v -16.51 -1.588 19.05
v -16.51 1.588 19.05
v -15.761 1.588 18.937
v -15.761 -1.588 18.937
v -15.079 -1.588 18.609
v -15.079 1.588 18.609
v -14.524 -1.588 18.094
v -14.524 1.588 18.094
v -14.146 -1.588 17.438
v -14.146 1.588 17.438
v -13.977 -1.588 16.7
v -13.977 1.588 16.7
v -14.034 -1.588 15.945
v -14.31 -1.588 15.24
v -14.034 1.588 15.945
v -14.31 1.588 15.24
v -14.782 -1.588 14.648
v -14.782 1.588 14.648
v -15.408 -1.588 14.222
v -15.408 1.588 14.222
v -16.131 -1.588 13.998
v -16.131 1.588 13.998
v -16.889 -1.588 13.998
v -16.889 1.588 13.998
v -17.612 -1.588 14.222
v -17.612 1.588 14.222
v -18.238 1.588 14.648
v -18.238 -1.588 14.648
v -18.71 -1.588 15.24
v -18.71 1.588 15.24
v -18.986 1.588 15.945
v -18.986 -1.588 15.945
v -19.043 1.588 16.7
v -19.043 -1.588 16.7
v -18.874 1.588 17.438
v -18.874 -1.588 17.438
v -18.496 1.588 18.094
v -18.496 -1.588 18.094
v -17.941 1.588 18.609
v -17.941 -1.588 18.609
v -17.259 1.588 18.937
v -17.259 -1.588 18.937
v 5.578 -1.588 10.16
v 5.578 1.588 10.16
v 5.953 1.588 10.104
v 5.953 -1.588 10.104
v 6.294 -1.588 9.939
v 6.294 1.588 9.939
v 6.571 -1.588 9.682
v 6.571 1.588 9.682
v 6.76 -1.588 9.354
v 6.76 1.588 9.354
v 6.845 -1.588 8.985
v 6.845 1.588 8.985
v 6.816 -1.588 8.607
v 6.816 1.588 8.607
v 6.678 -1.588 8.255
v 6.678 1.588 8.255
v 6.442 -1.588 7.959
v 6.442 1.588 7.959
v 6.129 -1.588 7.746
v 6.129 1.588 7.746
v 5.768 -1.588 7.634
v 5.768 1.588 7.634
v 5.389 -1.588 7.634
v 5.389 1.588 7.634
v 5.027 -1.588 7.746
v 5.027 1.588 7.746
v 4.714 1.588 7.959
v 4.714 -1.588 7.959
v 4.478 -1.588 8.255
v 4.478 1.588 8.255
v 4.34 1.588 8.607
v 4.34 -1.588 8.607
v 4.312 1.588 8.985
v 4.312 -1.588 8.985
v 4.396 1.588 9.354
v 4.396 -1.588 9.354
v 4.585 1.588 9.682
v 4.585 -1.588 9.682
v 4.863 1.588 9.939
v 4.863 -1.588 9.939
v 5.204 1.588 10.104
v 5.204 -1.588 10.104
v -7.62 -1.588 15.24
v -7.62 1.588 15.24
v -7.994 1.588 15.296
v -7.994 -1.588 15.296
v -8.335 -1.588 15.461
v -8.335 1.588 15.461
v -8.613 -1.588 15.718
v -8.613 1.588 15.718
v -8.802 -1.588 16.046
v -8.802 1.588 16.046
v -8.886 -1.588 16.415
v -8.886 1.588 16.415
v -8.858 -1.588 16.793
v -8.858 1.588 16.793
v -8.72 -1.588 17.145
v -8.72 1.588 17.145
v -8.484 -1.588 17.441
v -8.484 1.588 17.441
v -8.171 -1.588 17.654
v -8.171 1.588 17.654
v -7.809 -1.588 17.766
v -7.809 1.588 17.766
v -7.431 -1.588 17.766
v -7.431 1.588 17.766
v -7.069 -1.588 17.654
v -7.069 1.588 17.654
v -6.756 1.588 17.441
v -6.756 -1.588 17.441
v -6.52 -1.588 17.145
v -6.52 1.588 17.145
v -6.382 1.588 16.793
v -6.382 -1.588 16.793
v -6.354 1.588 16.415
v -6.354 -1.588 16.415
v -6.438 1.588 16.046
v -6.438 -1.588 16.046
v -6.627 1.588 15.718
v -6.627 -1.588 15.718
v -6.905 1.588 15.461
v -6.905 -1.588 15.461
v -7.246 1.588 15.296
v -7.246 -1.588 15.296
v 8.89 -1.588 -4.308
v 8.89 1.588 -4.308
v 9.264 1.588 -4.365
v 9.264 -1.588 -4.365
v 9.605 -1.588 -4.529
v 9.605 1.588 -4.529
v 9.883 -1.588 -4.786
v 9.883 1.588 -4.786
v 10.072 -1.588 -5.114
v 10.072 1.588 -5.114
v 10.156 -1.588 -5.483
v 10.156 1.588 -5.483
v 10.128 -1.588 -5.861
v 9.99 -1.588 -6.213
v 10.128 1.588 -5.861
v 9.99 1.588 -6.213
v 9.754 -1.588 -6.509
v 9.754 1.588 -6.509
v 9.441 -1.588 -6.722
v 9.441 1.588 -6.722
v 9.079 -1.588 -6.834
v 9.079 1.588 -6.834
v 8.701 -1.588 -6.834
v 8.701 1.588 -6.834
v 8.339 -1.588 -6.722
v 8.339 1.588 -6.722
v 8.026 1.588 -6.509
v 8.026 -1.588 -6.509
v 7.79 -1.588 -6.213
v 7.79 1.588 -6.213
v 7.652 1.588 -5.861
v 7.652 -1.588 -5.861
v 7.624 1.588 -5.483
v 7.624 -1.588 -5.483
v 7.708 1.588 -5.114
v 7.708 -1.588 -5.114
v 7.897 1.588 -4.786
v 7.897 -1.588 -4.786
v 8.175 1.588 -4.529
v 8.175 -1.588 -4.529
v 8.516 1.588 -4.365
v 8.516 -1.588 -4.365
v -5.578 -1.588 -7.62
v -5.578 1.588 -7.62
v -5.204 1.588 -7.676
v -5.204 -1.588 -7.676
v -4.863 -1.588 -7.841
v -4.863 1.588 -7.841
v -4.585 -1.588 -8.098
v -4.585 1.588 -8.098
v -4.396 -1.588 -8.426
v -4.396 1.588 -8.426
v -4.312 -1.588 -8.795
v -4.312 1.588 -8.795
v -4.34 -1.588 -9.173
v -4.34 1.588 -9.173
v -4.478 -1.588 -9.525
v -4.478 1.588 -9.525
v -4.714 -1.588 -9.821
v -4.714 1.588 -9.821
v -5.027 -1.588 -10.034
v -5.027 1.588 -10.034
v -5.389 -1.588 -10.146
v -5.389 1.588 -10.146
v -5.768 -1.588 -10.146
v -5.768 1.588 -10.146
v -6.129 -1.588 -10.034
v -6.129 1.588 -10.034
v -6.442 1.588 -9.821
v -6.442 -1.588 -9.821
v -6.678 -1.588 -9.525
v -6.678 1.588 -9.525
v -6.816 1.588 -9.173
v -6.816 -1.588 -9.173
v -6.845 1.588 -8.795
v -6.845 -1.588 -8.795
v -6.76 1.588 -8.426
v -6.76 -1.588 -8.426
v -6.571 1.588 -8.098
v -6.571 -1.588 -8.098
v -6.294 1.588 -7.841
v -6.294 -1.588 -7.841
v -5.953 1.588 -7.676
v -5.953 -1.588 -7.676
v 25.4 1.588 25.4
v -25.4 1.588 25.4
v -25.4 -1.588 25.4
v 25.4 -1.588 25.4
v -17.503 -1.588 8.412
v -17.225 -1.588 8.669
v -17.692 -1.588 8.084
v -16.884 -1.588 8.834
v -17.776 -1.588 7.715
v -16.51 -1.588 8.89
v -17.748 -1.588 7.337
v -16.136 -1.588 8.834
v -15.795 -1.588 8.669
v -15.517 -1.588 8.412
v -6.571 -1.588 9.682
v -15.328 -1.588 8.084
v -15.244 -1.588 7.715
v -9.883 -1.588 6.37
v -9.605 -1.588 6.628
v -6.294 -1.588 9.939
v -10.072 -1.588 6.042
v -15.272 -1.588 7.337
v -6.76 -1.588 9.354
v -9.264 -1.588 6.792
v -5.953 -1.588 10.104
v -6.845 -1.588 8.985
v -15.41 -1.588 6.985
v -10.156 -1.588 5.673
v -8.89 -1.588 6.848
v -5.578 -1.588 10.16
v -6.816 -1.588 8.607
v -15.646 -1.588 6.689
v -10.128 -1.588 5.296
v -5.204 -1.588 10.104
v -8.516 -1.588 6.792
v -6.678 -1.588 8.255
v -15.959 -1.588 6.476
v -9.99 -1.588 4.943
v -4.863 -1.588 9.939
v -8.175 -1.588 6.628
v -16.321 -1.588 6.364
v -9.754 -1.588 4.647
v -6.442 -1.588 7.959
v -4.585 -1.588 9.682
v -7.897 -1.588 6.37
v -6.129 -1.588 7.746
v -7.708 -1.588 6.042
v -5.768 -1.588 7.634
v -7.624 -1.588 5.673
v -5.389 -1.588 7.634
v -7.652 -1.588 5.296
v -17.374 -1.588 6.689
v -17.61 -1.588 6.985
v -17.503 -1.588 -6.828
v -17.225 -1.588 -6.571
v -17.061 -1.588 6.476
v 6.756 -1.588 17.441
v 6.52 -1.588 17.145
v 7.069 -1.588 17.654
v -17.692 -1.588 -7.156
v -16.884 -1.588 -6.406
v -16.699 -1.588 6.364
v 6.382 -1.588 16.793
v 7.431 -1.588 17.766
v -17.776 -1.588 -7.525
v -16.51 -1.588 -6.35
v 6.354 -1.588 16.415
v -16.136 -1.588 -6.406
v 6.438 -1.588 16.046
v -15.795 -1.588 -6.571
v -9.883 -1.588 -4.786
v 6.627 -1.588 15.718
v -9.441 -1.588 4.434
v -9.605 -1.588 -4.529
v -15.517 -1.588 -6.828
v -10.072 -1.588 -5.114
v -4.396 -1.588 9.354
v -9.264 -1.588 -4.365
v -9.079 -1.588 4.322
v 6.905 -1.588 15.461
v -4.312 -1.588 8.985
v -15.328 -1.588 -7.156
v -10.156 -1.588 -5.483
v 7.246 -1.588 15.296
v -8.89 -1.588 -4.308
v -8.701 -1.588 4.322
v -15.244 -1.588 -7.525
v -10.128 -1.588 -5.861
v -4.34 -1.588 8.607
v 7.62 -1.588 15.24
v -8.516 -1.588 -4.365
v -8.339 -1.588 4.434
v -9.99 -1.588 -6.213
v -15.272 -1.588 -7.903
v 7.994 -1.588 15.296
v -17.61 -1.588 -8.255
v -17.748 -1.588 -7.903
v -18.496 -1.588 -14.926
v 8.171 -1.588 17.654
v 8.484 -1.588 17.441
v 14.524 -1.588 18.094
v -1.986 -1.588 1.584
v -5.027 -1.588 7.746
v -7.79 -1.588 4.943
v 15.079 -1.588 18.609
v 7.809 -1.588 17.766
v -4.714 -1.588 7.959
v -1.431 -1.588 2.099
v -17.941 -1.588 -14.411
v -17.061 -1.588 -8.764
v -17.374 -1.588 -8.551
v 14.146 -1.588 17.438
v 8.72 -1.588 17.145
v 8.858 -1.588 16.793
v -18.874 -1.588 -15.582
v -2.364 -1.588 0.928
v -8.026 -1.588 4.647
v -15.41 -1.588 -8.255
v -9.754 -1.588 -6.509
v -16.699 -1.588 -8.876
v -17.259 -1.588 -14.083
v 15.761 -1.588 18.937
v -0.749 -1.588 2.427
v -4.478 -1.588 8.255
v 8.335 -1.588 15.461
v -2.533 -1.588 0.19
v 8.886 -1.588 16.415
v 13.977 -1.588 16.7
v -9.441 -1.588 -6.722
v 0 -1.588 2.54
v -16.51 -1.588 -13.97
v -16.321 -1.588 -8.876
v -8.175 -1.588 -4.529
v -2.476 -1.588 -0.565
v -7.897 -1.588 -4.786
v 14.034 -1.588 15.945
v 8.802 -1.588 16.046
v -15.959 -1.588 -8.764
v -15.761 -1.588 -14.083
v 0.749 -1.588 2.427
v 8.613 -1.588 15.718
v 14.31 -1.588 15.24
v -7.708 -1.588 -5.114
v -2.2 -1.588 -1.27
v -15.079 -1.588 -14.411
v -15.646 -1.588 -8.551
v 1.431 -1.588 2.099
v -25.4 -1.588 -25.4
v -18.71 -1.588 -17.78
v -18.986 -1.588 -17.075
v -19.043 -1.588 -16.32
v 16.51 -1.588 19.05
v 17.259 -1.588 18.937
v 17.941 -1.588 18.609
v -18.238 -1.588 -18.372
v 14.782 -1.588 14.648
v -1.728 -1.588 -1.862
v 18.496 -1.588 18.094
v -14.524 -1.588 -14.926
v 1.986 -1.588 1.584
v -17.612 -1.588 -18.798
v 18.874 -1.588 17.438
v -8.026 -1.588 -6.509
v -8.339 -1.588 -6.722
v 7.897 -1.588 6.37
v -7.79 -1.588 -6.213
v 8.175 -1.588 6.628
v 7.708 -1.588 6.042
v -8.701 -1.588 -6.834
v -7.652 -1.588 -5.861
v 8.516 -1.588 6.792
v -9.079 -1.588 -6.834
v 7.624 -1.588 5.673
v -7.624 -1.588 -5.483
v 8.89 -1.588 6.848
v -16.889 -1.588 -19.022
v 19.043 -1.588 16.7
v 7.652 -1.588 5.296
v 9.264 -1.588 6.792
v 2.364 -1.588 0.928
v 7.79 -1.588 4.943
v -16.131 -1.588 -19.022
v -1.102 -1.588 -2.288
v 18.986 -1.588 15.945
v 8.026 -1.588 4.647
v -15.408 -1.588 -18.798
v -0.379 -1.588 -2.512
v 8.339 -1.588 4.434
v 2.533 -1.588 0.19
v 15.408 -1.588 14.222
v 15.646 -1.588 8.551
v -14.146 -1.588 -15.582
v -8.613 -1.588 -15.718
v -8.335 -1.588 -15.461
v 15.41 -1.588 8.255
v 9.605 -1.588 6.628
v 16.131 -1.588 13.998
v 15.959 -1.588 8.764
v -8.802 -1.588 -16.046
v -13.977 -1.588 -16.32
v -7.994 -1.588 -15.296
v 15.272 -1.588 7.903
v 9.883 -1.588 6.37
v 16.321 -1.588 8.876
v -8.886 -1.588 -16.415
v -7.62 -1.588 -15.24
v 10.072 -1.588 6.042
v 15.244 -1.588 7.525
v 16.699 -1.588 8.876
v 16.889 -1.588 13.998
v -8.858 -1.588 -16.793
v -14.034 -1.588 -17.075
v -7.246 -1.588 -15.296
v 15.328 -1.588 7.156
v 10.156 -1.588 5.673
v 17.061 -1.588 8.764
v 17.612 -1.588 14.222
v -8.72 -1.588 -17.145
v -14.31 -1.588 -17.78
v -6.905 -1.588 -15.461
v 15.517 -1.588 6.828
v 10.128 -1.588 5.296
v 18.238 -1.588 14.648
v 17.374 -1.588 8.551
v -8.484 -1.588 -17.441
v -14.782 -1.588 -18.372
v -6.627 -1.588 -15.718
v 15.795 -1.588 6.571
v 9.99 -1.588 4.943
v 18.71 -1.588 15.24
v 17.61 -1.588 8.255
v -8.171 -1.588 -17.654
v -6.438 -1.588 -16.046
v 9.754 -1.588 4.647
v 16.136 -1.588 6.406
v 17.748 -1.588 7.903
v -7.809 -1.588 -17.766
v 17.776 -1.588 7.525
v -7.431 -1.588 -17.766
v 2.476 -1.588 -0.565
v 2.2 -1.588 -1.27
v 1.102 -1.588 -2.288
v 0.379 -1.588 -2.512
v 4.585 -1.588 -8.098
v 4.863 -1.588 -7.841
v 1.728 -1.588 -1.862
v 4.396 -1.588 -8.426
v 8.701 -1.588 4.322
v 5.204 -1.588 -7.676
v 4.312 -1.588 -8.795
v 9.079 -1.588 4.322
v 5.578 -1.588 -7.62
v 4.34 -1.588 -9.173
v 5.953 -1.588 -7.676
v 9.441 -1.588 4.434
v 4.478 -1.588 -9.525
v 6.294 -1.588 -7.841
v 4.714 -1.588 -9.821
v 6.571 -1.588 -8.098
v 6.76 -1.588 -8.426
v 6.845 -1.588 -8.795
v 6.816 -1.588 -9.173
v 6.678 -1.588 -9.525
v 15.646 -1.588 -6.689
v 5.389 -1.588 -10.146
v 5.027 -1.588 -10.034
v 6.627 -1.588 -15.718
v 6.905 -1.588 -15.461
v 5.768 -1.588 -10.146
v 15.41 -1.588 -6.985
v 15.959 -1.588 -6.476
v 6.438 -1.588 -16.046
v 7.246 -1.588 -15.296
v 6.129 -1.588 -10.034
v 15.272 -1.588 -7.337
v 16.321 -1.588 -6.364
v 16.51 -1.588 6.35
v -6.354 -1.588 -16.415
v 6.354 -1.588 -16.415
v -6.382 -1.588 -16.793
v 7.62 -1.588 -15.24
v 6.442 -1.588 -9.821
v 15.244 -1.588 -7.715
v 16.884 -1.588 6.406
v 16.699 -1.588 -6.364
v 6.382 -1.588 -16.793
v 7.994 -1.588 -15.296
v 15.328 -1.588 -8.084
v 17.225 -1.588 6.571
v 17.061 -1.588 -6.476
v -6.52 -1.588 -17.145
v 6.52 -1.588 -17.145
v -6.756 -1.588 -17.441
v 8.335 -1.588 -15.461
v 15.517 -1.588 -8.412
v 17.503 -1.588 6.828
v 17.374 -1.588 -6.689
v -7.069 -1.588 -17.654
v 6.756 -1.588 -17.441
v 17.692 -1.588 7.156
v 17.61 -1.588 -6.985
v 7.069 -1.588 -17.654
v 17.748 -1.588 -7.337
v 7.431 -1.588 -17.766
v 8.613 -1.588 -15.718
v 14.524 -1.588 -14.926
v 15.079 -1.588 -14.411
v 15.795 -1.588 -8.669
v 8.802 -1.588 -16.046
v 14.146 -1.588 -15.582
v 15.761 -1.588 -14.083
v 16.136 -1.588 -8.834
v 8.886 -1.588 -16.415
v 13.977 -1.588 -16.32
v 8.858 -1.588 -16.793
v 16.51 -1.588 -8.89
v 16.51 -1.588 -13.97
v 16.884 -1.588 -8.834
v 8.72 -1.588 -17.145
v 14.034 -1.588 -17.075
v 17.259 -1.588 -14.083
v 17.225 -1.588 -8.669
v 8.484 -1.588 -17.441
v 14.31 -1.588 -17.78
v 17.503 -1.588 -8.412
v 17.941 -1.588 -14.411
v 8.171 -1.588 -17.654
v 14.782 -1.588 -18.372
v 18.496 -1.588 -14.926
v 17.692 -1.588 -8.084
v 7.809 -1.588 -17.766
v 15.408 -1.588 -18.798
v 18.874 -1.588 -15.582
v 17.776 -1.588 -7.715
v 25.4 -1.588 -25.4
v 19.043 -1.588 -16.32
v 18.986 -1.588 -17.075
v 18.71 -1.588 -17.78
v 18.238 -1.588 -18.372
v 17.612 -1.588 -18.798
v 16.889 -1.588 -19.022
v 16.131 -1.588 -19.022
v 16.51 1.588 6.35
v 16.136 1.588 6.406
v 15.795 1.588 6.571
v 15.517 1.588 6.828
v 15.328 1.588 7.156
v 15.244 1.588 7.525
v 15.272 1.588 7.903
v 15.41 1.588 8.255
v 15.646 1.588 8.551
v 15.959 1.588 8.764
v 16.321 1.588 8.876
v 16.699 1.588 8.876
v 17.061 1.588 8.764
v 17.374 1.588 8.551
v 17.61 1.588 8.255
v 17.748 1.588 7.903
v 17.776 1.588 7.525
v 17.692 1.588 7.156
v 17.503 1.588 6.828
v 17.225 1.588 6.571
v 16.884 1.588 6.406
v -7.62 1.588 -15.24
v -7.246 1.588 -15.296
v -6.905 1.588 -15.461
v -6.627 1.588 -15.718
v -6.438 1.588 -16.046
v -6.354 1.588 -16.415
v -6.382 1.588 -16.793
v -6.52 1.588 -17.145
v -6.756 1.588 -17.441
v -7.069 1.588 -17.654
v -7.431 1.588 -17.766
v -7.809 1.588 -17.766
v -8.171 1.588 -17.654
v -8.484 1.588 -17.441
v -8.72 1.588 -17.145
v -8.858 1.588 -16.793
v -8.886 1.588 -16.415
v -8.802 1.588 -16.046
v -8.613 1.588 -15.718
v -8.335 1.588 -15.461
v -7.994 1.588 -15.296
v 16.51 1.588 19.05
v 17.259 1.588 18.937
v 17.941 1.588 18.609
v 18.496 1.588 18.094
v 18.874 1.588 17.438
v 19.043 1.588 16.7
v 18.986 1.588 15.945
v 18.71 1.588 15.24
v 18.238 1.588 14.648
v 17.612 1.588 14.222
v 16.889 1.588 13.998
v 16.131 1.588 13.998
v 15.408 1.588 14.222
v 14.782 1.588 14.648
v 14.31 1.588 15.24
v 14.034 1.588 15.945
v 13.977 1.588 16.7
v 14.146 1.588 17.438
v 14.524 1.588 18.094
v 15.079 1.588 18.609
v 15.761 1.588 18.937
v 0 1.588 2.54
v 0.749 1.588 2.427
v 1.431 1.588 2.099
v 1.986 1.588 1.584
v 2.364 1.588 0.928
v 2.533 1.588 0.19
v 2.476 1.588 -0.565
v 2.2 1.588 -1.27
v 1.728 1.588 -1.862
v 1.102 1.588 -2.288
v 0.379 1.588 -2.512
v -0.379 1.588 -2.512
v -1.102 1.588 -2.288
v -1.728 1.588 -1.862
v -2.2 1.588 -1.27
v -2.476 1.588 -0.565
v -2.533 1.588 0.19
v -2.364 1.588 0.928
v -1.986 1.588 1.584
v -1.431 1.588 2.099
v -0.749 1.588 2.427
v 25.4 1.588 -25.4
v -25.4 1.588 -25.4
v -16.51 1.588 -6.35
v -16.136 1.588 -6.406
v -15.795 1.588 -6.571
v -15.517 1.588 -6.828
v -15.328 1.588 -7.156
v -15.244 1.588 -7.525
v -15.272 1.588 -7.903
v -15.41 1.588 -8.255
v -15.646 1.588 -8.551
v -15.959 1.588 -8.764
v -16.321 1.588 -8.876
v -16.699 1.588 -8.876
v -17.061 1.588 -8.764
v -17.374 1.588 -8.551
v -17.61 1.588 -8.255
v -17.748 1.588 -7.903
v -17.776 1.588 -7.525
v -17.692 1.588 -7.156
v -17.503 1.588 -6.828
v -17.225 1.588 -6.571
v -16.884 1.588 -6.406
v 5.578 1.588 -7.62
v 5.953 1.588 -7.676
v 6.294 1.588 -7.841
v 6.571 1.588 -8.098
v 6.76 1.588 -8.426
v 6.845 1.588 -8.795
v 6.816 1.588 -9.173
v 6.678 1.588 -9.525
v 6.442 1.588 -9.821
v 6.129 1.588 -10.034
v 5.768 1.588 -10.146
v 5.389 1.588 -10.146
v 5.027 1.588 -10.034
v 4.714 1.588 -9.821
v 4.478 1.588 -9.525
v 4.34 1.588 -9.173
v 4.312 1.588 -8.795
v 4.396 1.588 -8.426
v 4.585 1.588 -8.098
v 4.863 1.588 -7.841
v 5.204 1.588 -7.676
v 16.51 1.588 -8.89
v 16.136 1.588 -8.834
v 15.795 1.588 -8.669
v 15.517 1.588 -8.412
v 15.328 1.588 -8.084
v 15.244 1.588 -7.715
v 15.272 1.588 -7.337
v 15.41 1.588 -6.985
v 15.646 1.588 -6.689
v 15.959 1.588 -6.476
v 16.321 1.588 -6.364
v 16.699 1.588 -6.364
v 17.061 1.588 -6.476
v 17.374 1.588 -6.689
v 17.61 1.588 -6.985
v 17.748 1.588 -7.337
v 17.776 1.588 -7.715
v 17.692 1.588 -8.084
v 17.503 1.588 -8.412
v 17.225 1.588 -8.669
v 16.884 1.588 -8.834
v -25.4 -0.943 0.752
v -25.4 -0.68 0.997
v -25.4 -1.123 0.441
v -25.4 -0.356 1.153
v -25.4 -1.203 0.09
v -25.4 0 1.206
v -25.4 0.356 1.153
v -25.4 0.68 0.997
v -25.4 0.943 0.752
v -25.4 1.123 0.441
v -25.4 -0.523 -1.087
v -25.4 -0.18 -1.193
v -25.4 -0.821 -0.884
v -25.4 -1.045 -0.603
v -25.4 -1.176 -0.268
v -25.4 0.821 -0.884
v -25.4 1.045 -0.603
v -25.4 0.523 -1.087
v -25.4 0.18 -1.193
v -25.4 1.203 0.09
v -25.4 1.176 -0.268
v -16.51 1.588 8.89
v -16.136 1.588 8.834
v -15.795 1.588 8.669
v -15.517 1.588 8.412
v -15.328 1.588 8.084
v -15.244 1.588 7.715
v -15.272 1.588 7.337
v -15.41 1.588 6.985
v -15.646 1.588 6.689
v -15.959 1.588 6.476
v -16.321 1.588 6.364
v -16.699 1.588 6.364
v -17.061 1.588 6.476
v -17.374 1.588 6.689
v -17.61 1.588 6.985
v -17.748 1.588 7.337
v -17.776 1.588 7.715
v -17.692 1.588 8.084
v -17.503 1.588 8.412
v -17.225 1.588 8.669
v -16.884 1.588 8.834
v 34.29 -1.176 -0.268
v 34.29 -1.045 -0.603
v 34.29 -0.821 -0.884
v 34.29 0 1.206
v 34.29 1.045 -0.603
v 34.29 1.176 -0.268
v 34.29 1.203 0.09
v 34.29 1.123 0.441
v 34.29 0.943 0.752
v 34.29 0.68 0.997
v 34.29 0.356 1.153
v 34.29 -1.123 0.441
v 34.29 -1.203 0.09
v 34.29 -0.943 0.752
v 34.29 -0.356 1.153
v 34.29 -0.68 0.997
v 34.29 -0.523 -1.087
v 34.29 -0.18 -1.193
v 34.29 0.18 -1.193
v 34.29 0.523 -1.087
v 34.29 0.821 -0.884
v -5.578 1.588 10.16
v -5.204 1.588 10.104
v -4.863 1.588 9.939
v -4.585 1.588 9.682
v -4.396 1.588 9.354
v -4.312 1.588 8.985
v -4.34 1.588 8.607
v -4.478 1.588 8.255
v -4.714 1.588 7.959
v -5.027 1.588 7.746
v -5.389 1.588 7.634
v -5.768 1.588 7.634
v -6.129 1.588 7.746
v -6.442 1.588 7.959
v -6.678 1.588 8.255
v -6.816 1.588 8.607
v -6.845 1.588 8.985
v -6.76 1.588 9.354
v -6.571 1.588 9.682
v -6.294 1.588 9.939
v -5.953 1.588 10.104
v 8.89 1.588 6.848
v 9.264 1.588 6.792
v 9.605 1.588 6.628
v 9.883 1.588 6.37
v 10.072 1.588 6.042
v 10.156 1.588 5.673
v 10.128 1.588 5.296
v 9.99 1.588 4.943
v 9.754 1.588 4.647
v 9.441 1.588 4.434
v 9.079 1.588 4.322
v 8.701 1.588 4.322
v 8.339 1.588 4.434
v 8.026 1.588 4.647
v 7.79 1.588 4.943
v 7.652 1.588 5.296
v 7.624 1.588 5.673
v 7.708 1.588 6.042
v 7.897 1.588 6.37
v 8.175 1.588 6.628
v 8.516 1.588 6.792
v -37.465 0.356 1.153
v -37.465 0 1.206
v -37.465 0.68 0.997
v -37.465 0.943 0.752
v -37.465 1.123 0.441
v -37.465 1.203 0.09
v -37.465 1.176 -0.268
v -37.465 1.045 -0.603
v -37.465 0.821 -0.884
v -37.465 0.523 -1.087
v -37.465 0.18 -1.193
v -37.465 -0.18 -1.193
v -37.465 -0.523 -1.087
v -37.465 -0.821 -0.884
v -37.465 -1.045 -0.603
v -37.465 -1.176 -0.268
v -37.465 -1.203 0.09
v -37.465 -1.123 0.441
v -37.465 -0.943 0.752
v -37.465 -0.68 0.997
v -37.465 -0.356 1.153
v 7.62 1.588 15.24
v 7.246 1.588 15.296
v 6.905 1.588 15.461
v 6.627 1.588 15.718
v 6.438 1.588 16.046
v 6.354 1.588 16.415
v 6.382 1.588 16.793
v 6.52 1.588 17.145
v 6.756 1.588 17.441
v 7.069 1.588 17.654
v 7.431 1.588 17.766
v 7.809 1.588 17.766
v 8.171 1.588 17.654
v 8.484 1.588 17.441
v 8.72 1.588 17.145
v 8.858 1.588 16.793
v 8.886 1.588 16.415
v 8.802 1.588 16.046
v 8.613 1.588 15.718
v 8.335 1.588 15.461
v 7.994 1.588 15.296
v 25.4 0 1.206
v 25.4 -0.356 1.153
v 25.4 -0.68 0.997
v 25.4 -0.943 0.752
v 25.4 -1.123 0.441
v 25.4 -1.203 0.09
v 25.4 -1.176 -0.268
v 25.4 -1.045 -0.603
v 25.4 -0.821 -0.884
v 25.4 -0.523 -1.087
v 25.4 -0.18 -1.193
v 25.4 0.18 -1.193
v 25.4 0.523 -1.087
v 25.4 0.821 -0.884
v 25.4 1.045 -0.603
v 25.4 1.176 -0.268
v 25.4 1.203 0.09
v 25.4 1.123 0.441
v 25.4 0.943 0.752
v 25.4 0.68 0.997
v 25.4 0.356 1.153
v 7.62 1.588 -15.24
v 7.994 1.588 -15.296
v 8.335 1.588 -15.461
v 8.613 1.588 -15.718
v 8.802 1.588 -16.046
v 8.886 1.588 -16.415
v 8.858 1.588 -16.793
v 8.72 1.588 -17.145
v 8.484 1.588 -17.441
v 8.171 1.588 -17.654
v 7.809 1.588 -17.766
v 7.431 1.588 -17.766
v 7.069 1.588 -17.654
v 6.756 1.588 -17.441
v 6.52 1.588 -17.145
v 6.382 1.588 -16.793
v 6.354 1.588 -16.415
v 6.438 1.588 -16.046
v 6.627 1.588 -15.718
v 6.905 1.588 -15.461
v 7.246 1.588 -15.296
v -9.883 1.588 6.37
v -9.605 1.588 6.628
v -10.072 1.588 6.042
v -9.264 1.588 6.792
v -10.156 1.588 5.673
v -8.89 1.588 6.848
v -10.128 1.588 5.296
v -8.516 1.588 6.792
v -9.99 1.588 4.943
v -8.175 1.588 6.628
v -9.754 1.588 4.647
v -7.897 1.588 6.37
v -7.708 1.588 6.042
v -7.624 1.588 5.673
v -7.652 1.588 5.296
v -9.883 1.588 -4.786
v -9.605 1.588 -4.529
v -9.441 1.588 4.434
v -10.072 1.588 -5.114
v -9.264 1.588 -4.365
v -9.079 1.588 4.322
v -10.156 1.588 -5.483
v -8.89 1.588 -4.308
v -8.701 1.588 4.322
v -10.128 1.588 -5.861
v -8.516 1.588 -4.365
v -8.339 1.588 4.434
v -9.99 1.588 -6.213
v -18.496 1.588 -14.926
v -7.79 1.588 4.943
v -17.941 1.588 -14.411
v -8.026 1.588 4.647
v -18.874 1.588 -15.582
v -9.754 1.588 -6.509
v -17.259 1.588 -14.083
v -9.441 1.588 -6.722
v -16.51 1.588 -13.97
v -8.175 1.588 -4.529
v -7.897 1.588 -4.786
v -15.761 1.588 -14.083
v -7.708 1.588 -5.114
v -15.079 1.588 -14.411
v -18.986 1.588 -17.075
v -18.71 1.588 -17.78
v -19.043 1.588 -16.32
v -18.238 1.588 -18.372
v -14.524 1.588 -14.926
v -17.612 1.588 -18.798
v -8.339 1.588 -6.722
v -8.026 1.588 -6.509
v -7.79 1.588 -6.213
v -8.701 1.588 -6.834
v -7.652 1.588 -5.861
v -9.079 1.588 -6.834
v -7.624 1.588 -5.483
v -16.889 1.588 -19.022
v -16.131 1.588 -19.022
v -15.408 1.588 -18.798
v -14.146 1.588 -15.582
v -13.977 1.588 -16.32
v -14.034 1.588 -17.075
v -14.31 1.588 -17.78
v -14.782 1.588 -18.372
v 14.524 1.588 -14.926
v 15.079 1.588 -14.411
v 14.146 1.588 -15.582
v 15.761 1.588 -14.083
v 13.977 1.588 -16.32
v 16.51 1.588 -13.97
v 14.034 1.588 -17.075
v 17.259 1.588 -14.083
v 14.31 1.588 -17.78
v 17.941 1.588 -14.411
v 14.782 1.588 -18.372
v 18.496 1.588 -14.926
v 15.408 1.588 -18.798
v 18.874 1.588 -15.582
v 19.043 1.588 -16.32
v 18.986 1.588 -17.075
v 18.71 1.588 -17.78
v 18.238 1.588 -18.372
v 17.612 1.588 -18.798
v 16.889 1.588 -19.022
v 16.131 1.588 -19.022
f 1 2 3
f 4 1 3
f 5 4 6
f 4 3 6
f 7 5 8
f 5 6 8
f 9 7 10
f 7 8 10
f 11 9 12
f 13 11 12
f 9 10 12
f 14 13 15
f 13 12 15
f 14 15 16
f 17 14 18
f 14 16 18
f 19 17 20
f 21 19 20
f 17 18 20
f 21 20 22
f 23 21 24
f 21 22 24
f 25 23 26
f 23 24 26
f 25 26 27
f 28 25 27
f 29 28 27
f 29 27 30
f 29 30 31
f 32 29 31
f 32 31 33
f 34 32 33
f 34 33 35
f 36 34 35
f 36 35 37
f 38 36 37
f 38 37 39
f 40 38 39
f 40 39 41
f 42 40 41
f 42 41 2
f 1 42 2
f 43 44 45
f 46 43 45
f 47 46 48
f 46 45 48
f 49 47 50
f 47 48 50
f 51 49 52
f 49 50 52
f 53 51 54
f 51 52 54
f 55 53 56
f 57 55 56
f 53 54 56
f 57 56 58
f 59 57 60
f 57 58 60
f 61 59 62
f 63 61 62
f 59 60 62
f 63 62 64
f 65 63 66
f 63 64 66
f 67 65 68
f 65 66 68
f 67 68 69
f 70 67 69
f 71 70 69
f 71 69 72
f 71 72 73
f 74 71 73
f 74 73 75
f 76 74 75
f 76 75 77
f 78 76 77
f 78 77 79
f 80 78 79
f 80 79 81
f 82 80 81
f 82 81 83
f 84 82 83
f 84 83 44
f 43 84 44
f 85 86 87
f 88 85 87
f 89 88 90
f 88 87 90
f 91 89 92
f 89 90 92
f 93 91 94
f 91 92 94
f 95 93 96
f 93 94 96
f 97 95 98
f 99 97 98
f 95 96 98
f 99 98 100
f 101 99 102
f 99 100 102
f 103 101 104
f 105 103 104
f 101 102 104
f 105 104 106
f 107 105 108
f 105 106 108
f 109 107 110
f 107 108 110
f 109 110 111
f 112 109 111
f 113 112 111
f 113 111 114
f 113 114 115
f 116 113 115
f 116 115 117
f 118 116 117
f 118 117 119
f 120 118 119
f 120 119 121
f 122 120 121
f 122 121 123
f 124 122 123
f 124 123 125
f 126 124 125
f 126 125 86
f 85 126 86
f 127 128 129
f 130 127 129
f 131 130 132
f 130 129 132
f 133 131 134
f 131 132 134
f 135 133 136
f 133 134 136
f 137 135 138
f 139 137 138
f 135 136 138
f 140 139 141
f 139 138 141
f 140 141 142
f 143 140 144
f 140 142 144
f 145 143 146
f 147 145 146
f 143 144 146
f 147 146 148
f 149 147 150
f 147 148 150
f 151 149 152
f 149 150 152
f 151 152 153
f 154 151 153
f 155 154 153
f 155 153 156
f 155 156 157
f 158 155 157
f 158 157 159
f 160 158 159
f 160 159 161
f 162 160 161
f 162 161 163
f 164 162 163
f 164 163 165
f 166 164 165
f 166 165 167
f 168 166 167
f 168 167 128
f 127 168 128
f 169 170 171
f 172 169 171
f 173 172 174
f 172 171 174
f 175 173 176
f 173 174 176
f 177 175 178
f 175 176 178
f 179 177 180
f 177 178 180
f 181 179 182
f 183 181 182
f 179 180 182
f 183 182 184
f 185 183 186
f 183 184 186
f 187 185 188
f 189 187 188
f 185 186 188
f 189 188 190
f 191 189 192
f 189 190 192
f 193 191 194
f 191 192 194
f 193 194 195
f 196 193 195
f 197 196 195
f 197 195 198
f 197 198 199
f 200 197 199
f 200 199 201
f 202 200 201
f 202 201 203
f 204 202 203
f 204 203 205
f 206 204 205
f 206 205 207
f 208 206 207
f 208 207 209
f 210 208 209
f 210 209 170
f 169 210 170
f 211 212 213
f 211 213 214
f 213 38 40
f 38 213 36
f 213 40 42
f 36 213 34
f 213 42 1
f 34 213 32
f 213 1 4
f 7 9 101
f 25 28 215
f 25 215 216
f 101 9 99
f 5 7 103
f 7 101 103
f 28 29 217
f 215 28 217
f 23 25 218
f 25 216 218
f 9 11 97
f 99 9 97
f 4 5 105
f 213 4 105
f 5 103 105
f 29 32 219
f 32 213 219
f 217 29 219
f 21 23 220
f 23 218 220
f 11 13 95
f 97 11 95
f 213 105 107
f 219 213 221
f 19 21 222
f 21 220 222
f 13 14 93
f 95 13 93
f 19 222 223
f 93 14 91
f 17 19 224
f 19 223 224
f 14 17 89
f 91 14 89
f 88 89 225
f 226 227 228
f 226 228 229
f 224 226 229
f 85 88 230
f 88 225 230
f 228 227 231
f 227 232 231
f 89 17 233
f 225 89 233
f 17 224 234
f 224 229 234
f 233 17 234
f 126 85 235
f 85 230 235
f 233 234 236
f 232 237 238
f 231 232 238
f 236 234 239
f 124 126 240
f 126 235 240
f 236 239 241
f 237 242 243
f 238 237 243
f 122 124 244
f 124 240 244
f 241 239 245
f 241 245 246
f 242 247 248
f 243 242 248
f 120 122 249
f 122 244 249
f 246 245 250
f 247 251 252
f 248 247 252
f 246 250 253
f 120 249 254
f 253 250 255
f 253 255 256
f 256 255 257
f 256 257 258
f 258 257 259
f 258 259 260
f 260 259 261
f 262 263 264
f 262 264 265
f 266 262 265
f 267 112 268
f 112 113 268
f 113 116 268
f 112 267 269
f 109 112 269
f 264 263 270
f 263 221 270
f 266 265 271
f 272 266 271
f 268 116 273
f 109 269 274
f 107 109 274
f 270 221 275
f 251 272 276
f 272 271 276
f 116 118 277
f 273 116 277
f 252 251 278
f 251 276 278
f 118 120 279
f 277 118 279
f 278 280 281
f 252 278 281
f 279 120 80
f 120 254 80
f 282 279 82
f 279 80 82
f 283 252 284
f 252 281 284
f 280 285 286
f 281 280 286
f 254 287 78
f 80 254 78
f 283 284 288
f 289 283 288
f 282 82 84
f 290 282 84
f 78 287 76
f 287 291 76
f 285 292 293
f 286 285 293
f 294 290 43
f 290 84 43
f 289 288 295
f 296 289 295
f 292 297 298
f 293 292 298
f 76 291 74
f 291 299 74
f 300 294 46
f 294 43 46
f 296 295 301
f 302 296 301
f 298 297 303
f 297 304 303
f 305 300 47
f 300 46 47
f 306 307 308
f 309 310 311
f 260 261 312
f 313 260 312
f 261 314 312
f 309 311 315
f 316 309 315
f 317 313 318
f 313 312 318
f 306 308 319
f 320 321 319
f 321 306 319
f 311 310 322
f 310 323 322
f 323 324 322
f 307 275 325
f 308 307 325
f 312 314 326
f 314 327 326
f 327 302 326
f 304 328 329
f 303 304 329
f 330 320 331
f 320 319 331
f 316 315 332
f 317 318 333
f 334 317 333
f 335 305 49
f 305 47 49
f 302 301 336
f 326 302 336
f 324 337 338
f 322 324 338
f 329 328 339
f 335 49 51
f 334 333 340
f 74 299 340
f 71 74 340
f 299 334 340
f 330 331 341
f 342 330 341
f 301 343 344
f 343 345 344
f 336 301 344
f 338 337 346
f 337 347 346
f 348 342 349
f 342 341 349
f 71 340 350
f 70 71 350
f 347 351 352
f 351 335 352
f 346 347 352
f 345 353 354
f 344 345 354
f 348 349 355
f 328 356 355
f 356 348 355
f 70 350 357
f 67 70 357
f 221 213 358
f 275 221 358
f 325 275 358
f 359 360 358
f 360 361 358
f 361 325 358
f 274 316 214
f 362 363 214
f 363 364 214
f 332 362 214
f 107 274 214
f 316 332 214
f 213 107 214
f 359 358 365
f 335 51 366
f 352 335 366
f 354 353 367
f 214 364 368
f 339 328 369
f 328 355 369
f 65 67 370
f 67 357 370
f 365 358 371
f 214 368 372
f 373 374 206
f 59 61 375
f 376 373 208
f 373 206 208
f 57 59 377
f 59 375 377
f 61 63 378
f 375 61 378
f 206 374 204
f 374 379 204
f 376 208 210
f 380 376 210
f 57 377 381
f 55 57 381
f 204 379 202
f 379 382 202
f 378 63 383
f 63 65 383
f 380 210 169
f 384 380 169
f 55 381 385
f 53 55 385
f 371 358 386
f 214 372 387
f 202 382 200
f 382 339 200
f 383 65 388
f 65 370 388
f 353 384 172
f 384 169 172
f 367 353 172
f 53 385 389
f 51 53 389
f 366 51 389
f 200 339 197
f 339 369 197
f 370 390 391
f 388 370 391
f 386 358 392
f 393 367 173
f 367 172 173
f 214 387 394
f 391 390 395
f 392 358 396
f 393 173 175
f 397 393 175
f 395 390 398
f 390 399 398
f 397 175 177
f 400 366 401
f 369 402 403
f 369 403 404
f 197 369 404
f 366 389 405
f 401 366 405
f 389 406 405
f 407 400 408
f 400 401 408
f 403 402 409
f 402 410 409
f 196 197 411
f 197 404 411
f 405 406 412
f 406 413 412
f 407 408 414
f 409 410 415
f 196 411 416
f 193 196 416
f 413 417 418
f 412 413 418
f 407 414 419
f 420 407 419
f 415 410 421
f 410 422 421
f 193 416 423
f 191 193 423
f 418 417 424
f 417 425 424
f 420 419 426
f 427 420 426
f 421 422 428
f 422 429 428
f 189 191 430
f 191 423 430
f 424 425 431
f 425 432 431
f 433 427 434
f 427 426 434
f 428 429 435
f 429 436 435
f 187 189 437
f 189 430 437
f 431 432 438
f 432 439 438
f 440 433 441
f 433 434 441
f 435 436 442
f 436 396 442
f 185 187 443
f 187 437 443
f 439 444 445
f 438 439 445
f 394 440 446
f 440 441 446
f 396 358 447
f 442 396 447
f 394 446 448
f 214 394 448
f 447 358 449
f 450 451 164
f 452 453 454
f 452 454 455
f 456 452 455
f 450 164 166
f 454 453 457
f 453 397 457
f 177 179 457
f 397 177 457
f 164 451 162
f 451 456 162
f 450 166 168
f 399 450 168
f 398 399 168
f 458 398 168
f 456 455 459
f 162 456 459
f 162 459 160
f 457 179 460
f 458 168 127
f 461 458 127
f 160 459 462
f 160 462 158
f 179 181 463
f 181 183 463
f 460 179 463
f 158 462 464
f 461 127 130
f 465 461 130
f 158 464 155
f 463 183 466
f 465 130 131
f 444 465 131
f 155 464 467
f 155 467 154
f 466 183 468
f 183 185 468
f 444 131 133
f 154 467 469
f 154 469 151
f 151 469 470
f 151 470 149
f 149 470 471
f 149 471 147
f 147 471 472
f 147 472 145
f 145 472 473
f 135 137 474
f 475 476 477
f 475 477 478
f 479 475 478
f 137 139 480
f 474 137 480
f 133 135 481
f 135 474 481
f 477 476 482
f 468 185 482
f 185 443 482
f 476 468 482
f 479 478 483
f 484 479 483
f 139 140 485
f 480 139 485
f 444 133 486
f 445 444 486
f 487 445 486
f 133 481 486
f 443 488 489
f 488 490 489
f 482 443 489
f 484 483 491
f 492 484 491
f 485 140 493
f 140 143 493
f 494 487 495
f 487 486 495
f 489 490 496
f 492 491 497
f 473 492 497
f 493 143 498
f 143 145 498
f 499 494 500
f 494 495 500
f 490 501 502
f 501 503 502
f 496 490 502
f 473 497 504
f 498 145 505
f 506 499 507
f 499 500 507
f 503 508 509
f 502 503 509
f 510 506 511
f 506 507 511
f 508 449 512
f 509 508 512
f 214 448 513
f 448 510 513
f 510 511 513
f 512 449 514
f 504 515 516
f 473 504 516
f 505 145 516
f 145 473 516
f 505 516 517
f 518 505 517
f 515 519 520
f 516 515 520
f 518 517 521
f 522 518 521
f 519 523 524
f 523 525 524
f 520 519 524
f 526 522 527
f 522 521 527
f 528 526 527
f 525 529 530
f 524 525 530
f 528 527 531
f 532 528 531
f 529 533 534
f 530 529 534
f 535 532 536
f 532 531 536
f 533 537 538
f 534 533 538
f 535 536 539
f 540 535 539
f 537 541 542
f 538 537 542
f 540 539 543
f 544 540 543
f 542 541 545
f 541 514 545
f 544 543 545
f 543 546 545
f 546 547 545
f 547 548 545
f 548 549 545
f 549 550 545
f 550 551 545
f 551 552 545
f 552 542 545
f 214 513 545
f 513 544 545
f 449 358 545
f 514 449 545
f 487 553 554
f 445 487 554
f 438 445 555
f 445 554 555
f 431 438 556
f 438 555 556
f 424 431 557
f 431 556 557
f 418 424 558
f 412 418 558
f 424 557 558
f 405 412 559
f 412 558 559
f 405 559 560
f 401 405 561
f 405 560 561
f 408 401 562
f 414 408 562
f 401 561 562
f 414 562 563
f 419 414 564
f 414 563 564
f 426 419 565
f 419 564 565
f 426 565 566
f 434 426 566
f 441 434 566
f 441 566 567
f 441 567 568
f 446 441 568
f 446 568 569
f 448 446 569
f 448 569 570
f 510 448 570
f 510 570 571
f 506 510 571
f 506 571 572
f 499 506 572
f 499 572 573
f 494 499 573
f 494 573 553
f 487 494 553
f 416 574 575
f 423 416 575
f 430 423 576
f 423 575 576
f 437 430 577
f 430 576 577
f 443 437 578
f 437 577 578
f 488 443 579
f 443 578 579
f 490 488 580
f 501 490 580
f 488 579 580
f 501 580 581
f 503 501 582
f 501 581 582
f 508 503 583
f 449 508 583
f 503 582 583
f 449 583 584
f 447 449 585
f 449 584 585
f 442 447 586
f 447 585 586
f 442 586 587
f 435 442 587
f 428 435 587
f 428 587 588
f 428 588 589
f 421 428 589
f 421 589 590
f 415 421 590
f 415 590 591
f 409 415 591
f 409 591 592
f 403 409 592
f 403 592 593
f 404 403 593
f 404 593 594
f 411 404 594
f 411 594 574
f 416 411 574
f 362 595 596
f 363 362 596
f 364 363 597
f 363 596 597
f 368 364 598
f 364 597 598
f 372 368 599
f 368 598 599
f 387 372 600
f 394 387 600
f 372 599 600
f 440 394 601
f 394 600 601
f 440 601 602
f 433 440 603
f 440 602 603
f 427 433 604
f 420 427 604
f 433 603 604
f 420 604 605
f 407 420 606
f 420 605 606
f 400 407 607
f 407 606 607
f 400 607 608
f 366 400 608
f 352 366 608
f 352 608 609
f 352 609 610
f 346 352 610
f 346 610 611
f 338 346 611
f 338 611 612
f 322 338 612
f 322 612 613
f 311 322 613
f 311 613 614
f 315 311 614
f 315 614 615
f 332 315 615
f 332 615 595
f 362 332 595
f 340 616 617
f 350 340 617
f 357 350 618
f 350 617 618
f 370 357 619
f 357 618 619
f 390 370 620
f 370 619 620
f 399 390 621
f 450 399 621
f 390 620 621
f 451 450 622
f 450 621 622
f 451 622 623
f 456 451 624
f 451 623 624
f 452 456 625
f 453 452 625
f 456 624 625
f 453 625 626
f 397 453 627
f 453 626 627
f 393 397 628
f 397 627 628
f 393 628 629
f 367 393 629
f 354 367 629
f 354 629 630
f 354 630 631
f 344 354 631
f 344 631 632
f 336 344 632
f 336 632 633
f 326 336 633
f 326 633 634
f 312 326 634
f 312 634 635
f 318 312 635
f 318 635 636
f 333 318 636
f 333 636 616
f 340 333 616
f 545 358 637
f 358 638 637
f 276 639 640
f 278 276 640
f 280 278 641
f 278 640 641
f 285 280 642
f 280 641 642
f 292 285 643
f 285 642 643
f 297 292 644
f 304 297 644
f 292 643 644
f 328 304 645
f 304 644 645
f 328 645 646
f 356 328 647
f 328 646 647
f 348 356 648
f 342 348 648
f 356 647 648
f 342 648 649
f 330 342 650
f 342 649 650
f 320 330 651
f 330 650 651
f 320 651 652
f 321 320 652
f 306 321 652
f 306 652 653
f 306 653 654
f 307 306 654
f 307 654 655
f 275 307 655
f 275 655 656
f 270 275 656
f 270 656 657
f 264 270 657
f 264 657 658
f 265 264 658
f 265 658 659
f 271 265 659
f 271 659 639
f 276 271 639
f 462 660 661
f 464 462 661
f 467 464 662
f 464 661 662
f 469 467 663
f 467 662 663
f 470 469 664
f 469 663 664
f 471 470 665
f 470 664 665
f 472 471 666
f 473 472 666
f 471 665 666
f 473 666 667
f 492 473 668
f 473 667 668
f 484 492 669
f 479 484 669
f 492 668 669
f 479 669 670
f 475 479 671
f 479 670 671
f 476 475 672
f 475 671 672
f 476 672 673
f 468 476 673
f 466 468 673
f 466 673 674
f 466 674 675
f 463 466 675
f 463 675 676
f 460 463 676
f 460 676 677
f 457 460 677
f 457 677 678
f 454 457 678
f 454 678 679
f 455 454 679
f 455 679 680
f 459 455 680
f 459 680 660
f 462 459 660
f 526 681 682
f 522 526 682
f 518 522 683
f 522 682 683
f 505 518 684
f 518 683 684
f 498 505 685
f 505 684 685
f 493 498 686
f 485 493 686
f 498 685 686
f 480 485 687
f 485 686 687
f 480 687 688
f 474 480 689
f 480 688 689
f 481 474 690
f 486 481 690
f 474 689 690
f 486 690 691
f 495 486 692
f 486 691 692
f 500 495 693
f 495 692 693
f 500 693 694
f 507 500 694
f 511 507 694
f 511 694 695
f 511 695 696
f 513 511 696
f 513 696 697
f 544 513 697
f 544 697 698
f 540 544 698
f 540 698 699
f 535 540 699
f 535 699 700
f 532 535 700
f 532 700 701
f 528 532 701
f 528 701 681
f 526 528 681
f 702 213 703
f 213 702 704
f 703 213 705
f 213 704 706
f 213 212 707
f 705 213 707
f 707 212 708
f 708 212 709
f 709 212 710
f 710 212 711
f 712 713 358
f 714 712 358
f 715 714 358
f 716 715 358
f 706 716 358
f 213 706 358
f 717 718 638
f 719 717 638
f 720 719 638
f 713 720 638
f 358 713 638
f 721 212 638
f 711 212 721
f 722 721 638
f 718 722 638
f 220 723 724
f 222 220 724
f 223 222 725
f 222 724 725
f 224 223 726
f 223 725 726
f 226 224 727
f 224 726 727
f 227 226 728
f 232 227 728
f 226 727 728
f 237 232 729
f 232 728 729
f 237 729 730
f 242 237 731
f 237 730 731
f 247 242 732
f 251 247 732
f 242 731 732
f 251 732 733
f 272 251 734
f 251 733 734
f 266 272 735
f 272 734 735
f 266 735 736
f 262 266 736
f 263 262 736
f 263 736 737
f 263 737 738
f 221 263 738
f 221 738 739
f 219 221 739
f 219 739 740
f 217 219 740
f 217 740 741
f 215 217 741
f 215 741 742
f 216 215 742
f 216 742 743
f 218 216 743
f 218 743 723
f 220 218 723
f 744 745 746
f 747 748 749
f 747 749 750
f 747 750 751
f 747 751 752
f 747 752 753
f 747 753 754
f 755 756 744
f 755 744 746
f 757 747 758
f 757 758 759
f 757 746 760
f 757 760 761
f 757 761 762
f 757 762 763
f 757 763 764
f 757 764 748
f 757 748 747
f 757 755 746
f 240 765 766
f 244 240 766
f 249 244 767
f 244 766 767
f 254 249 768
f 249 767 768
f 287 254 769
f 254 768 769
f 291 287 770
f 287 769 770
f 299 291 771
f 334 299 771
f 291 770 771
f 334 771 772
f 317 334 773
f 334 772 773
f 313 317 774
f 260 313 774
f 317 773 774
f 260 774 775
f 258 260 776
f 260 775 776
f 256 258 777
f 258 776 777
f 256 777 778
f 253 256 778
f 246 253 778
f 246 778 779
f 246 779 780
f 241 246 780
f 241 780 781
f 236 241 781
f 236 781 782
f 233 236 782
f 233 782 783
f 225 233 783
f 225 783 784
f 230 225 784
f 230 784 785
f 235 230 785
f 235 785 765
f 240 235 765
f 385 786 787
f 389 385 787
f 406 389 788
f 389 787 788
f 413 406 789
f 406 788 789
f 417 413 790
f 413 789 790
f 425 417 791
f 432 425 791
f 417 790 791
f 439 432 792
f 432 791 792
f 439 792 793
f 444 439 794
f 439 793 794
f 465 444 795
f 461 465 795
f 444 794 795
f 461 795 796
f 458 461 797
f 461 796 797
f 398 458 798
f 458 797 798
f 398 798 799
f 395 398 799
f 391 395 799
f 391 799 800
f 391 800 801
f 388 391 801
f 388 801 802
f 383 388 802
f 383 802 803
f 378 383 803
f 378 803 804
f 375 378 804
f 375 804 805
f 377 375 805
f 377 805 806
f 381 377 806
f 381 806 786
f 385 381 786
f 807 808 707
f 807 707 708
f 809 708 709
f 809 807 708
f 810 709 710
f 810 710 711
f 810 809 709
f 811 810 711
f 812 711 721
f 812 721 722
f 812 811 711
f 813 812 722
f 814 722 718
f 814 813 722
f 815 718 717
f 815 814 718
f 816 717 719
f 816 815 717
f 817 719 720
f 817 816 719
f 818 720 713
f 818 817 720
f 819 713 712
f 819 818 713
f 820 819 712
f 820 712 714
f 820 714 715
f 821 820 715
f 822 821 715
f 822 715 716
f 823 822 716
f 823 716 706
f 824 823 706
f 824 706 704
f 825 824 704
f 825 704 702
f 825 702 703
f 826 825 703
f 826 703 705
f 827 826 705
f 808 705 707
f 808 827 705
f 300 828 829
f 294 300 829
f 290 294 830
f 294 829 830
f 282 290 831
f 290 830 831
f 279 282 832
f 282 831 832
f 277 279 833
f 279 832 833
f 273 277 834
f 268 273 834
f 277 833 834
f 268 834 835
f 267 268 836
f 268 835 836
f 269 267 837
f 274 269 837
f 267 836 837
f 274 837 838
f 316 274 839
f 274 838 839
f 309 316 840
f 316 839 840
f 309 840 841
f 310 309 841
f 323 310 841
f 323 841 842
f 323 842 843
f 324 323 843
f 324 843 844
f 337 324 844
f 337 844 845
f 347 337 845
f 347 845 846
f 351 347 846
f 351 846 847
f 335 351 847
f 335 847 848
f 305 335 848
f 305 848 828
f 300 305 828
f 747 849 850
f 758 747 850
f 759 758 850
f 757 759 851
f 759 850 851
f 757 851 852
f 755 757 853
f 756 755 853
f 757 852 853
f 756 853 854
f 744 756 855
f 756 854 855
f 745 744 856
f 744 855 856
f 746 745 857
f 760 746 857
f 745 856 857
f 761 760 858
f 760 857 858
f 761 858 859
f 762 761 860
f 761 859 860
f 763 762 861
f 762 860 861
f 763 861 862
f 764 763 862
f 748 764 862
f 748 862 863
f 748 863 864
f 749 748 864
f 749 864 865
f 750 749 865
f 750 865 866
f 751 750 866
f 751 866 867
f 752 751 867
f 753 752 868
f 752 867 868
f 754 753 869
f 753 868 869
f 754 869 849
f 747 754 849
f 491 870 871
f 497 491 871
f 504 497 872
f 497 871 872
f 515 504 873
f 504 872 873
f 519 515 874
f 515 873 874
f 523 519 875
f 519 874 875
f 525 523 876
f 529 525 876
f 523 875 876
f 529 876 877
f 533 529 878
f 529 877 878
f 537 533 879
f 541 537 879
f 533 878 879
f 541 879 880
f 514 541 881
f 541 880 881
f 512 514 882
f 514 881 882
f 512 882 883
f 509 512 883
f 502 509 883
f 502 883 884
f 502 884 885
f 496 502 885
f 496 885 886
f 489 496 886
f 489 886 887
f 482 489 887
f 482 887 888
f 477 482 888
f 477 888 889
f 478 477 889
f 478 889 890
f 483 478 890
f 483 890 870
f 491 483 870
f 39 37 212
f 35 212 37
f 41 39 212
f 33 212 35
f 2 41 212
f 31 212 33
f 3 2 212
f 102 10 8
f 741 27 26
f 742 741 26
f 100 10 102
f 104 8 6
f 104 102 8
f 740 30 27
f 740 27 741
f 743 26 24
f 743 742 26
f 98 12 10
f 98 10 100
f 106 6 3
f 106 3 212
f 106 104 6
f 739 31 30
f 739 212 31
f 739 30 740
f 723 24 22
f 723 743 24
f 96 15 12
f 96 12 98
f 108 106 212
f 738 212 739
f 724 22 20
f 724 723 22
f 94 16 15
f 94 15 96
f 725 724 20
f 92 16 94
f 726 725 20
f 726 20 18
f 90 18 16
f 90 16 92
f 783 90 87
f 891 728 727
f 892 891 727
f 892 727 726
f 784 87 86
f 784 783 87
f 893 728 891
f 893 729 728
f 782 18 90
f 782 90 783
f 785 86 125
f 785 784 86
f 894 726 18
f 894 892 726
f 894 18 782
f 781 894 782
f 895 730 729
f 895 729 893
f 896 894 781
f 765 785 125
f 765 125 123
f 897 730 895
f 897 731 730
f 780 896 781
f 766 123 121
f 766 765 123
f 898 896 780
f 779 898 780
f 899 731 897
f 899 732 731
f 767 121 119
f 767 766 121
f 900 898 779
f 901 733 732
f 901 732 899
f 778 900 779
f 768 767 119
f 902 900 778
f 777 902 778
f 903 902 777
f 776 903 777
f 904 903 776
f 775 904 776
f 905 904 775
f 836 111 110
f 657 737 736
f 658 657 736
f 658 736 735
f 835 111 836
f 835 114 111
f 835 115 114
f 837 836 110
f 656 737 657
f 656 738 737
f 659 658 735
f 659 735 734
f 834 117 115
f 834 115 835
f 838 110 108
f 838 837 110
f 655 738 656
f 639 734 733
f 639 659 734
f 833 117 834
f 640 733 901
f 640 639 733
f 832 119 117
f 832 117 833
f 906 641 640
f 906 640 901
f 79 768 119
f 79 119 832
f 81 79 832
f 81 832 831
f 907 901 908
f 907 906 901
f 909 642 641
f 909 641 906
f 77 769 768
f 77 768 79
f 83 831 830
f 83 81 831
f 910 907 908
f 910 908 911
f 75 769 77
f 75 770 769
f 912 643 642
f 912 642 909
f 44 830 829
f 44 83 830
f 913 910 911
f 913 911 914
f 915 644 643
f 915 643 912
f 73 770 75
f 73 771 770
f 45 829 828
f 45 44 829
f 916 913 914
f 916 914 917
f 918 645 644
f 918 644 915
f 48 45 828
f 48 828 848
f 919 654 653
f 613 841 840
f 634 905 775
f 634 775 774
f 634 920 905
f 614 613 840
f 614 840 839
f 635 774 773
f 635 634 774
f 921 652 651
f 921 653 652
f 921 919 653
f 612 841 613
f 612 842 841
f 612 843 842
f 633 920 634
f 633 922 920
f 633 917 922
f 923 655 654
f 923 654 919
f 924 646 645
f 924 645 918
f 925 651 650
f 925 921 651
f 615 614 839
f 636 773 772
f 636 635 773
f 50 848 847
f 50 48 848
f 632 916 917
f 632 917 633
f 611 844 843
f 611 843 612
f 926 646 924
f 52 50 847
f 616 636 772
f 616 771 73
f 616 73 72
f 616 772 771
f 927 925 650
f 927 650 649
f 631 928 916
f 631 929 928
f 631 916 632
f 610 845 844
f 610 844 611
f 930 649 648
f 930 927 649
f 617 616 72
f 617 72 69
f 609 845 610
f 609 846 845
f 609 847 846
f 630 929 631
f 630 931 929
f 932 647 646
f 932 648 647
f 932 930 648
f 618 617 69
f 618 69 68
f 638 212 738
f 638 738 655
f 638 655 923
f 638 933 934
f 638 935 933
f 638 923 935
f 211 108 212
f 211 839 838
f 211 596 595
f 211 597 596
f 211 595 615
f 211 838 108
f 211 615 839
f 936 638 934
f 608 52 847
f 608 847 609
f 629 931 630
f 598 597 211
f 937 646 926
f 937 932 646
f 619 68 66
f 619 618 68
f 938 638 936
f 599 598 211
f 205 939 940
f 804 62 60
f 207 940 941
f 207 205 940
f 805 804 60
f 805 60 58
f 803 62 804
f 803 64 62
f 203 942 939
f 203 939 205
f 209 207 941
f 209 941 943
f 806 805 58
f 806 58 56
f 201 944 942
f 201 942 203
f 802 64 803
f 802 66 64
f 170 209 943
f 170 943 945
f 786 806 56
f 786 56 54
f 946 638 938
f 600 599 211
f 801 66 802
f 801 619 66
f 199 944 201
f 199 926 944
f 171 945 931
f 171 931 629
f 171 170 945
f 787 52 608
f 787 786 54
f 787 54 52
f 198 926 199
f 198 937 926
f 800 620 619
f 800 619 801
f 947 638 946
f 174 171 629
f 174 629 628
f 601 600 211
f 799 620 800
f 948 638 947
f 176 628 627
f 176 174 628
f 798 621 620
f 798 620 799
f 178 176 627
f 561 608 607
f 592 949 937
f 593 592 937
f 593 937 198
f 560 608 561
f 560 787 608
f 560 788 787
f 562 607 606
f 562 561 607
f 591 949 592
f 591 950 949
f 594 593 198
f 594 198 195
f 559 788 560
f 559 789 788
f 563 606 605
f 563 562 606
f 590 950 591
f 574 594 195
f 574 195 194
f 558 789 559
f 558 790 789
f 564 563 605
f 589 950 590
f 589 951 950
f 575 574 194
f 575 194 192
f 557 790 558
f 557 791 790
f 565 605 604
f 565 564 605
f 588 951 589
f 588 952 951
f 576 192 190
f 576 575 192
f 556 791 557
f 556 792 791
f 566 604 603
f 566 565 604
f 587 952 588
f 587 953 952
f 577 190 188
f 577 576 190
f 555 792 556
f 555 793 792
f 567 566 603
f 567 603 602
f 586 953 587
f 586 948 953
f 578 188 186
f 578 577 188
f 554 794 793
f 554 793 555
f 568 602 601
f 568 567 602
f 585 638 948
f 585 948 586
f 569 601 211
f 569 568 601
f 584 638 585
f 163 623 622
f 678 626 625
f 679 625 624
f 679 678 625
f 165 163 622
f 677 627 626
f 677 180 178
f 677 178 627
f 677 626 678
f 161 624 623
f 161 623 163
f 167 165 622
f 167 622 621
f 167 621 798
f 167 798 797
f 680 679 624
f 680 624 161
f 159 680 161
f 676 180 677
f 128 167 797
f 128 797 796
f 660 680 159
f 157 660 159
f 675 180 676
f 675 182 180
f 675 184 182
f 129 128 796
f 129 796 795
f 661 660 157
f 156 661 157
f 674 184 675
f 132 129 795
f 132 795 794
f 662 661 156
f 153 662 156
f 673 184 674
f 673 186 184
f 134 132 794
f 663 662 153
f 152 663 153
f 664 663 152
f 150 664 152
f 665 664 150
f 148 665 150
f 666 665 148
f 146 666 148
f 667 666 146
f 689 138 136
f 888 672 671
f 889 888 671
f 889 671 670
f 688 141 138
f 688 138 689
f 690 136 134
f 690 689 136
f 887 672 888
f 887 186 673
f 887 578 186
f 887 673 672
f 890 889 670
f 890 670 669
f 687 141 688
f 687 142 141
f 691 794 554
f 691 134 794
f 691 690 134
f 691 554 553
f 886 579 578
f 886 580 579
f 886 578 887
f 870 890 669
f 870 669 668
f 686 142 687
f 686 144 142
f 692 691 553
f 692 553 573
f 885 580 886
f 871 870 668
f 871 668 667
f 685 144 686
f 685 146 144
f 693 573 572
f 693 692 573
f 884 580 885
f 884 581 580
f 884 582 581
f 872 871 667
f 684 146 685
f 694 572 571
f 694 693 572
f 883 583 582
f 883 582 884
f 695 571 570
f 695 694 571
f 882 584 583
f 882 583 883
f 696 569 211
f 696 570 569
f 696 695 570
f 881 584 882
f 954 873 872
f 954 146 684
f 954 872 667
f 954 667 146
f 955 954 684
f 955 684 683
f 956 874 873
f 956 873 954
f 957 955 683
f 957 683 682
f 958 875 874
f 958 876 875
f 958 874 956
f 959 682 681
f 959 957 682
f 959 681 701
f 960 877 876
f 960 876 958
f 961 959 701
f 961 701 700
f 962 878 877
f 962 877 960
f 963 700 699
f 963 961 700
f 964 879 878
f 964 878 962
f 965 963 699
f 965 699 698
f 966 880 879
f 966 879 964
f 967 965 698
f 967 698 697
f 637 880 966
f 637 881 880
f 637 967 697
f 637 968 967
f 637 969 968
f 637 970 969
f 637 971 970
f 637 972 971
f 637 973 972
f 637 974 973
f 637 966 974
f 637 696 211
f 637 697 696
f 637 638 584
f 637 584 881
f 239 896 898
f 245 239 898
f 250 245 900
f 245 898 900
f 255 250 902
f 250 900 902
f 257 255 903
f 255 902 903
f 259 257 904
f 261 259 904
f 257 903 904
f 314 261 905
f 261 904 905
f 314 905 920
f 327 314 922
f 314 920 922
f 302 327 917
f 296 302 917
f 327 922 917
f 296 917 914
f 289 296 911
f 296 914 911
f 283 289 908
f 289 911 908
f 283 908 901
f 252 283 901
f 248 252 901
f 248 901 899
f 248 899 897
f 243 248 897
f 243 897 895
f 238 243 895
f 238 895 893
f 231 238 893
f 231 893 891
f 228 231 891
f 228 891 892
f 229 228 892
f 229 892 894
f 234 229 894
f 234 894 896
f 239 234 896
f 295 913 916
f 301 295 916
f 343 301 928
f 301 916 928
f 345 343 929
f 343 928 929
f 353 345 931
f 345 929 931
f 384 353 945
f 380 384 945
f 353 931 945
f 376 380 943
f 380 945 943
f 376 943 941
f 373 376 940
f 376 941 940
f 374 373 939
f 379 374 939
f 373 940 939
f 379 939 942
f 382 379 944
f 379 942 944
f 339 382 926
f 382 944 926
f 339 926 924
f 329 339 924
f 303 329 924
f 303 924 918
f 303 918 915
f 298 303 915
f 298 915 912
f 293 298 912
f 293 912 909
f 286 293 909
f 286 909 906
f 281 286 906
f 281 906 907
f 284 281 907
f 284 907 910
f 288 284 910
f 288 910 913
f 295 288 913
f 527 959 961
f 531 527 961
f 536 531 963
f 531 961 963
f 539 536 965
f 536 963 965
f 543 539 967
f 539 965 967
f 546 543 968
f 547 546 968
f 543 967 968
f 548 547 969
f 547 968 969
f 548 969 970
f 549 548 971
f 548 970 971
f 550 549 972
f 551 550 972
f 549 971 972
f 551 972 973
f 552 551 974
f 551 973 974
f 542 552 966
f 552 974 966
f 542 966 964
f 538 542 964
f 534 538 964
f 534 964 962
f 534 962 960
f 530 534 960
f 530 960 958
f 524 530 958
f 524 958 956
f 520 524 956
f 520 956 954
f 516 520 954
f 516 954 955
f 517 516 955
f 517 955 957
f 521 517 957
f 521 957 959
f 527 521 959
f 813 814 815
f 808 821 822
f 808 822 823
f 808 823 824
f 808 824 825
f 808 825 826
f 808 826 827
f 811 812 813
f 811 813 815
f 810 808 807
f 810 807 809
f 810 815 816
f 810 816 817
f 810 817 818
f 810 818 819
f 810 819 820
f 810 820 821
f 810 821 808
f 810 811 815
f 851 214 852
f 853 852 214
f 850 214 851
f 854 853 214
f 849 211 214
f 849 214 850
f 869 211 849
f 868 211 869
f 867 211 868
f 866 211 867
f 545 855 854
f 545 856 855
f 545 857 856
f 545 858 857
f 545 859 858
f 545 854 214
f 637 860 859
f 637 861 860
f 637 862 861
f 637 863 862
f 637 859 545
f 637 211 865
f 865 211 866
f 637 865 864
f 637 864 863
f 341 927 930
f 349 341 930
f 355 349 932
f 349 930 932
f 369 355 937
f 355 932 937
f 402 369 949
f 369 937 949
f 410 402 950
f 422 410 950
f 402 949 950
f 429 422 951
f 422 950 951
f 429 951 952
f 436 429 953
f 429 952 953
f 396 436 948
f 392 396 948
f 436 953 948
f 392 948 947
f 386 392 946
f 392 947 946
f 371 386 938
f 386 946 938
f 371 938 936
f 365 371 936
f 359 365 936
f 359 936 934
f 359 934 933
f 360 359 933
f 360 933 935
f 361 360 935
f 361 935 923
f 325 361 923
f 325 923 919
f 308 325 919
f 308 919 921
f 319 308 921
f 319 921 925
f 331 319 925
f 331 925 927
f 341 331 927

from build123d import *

# Parameters (mm, degrees)
SKETCH1_W           = 50.8
SKETCH1_H           = 50.8
BOSS_EXTRUDE1_DEPTH = 1.5875
SKETCH3_R           = 1.2065
BOSS_EXTRUDE2_DEPTH = 8.89
SKETCH4_R           = 2.54
SKETCH4_R_2         = 1.27
CUT_EXTRUDE1_DEPTH  = 43.790708396
BOSS_EXTRUDE3_START = 12.065
SKETCH5_R           = 1.2065
BOSS_EXTRUDE3_DEPTH = 12.065


with BuildPart() as part:
    # Sketch1 → Boss-Extrude1 (new, symmetric)
    with BuildSketch(Plane(origin=(0, 0, 0), x_dir=(1, 0, 0), z_dir=(0, 1, 0))):
        Rectangle(SKETCH1_W, SKETCH1_H)
    extrude(amount=BOSS_EXTRUDE1_DEPTH, both=True)

    # Sketch3 → Boss-Extrude2 (add)
    with BuildSketch(Plane(origin=(25.4, 0, 0), x_dir=(0, 0, -1), z_dir=(1, 0, 0))):
        with Locations(Location((0, 0, 0), (0, 0, 180))):
            Circle(SKETCH3_R)
    extrude(amount=BOSS_EXTRUDE2_DEPTH)

    # Sketch4 → Cut-Extrude1 (cut, through all)
    with BuildSketch(Plane(origin=(0, 1.5875, 0), x_dir=(1, 0, 0), z_dir=(0, 1, 0))):
        with Locations(Location((0, 0, 0), (0, 0, 270))):
            Circle(SKETCH4_R)
        with Locations(Location((-16.51, 16.51, 0), (0, 0, 270))):
            Circle(SKETCH4_R)
        with Locations(Location((16.51, 16.51, 0), (0, 0, 270))):
            Circle(SKETCH4_R)
        with Locations(Location((16.51, -16.51, 0), (0, 0, 270))):
            Circle(SKETCH4_R)
        with Locations(Location((-16.51, -16.51, 0), (0, 0, 270))):
            Circle(SKETCH4_R)
        with Locations(Location((-16.51, 7.62, 0), (0, 0, 270))):
            Circle(SKETCH4_R_2)
        with Locations(Location((-7.62, 16.51, 0), (0, 0, 270))):
            Circle(SKETCH4_R_2)
        with Locations(Location((7.62, 16.51, 0), (0, 0, 270))):
            Circle(SKETCH4_R_2)
        with Locations(Location((-16.51, -7.62, 0), (0, 0, 270))):
            Circle(SKETCH4_R_2)
        with Locations(Location((7.62, -16.51, 0), (0, 0, 90))):
            Circle(SKETCH4_R_2)
        with Locations(Location((-7.62, -16.51, 0), (0, 0, 90))):
            Circle(SKETCH4_R_2)
        with Locations(Location((16.51, -7.62, 0), (0, 0, 90))):
            Circle(SKETCH4_R_2)
        with Locations(Location((16.51, 7.62, 0), (0, 0, 90))):
            Circle(SKETCH4_R_2)
        with Locations(Location((5.578227154, 8.89, 0), (0, 0, 270))):
            Circle(SKETCH4_R_2)
        with Locations(Location((-5.578227154, 8.89, 0), (0, 0, 270))):
            Circle(SKETCH4_R_2)
        with Locations(Location((8.89, -5.578227154, 0), (0, 0, 270))):
            Circle(SKETCH4_R_2)
        with Locations(Location((8.89, 5.578227154, 0), (0, 0, 270))):
            Circle(SKETCH4_R_2)
        with Locations(Location((-5.578227154, -8.89, 0), (0, 0, 270))):
            Circle(SKETCH4_R_2)
        with Locations(Location((5.578227154, -8.89, 0), (0, 0, 270))):
            Circle(SKETCH4_R_2)
        with Locations(Location((-8.89, 5.578227154, 0), (0, 0, 270))):
            Circle(SKETCH4_R_2)
        with Locations(Location((-8.89, -5.578227154, 0), (0, 0, 270))):
            Circle(SKETCH4_R_2)
    extrude(amount=-CUT_EXTRUDE1_DEPTH, mode=Mode.SUBTRACT)

    # Sketch5 → Boss-Extrude3 (add)
    with BuildSketch(Plane.ZY.offset(25.4).offset(BOSS_EXTRUDE3_START)):
        Circle(SKETCH5_R)
    extrude(amount=-BOSS_EXTRUDE3_DEPTH)


solid = part.part
